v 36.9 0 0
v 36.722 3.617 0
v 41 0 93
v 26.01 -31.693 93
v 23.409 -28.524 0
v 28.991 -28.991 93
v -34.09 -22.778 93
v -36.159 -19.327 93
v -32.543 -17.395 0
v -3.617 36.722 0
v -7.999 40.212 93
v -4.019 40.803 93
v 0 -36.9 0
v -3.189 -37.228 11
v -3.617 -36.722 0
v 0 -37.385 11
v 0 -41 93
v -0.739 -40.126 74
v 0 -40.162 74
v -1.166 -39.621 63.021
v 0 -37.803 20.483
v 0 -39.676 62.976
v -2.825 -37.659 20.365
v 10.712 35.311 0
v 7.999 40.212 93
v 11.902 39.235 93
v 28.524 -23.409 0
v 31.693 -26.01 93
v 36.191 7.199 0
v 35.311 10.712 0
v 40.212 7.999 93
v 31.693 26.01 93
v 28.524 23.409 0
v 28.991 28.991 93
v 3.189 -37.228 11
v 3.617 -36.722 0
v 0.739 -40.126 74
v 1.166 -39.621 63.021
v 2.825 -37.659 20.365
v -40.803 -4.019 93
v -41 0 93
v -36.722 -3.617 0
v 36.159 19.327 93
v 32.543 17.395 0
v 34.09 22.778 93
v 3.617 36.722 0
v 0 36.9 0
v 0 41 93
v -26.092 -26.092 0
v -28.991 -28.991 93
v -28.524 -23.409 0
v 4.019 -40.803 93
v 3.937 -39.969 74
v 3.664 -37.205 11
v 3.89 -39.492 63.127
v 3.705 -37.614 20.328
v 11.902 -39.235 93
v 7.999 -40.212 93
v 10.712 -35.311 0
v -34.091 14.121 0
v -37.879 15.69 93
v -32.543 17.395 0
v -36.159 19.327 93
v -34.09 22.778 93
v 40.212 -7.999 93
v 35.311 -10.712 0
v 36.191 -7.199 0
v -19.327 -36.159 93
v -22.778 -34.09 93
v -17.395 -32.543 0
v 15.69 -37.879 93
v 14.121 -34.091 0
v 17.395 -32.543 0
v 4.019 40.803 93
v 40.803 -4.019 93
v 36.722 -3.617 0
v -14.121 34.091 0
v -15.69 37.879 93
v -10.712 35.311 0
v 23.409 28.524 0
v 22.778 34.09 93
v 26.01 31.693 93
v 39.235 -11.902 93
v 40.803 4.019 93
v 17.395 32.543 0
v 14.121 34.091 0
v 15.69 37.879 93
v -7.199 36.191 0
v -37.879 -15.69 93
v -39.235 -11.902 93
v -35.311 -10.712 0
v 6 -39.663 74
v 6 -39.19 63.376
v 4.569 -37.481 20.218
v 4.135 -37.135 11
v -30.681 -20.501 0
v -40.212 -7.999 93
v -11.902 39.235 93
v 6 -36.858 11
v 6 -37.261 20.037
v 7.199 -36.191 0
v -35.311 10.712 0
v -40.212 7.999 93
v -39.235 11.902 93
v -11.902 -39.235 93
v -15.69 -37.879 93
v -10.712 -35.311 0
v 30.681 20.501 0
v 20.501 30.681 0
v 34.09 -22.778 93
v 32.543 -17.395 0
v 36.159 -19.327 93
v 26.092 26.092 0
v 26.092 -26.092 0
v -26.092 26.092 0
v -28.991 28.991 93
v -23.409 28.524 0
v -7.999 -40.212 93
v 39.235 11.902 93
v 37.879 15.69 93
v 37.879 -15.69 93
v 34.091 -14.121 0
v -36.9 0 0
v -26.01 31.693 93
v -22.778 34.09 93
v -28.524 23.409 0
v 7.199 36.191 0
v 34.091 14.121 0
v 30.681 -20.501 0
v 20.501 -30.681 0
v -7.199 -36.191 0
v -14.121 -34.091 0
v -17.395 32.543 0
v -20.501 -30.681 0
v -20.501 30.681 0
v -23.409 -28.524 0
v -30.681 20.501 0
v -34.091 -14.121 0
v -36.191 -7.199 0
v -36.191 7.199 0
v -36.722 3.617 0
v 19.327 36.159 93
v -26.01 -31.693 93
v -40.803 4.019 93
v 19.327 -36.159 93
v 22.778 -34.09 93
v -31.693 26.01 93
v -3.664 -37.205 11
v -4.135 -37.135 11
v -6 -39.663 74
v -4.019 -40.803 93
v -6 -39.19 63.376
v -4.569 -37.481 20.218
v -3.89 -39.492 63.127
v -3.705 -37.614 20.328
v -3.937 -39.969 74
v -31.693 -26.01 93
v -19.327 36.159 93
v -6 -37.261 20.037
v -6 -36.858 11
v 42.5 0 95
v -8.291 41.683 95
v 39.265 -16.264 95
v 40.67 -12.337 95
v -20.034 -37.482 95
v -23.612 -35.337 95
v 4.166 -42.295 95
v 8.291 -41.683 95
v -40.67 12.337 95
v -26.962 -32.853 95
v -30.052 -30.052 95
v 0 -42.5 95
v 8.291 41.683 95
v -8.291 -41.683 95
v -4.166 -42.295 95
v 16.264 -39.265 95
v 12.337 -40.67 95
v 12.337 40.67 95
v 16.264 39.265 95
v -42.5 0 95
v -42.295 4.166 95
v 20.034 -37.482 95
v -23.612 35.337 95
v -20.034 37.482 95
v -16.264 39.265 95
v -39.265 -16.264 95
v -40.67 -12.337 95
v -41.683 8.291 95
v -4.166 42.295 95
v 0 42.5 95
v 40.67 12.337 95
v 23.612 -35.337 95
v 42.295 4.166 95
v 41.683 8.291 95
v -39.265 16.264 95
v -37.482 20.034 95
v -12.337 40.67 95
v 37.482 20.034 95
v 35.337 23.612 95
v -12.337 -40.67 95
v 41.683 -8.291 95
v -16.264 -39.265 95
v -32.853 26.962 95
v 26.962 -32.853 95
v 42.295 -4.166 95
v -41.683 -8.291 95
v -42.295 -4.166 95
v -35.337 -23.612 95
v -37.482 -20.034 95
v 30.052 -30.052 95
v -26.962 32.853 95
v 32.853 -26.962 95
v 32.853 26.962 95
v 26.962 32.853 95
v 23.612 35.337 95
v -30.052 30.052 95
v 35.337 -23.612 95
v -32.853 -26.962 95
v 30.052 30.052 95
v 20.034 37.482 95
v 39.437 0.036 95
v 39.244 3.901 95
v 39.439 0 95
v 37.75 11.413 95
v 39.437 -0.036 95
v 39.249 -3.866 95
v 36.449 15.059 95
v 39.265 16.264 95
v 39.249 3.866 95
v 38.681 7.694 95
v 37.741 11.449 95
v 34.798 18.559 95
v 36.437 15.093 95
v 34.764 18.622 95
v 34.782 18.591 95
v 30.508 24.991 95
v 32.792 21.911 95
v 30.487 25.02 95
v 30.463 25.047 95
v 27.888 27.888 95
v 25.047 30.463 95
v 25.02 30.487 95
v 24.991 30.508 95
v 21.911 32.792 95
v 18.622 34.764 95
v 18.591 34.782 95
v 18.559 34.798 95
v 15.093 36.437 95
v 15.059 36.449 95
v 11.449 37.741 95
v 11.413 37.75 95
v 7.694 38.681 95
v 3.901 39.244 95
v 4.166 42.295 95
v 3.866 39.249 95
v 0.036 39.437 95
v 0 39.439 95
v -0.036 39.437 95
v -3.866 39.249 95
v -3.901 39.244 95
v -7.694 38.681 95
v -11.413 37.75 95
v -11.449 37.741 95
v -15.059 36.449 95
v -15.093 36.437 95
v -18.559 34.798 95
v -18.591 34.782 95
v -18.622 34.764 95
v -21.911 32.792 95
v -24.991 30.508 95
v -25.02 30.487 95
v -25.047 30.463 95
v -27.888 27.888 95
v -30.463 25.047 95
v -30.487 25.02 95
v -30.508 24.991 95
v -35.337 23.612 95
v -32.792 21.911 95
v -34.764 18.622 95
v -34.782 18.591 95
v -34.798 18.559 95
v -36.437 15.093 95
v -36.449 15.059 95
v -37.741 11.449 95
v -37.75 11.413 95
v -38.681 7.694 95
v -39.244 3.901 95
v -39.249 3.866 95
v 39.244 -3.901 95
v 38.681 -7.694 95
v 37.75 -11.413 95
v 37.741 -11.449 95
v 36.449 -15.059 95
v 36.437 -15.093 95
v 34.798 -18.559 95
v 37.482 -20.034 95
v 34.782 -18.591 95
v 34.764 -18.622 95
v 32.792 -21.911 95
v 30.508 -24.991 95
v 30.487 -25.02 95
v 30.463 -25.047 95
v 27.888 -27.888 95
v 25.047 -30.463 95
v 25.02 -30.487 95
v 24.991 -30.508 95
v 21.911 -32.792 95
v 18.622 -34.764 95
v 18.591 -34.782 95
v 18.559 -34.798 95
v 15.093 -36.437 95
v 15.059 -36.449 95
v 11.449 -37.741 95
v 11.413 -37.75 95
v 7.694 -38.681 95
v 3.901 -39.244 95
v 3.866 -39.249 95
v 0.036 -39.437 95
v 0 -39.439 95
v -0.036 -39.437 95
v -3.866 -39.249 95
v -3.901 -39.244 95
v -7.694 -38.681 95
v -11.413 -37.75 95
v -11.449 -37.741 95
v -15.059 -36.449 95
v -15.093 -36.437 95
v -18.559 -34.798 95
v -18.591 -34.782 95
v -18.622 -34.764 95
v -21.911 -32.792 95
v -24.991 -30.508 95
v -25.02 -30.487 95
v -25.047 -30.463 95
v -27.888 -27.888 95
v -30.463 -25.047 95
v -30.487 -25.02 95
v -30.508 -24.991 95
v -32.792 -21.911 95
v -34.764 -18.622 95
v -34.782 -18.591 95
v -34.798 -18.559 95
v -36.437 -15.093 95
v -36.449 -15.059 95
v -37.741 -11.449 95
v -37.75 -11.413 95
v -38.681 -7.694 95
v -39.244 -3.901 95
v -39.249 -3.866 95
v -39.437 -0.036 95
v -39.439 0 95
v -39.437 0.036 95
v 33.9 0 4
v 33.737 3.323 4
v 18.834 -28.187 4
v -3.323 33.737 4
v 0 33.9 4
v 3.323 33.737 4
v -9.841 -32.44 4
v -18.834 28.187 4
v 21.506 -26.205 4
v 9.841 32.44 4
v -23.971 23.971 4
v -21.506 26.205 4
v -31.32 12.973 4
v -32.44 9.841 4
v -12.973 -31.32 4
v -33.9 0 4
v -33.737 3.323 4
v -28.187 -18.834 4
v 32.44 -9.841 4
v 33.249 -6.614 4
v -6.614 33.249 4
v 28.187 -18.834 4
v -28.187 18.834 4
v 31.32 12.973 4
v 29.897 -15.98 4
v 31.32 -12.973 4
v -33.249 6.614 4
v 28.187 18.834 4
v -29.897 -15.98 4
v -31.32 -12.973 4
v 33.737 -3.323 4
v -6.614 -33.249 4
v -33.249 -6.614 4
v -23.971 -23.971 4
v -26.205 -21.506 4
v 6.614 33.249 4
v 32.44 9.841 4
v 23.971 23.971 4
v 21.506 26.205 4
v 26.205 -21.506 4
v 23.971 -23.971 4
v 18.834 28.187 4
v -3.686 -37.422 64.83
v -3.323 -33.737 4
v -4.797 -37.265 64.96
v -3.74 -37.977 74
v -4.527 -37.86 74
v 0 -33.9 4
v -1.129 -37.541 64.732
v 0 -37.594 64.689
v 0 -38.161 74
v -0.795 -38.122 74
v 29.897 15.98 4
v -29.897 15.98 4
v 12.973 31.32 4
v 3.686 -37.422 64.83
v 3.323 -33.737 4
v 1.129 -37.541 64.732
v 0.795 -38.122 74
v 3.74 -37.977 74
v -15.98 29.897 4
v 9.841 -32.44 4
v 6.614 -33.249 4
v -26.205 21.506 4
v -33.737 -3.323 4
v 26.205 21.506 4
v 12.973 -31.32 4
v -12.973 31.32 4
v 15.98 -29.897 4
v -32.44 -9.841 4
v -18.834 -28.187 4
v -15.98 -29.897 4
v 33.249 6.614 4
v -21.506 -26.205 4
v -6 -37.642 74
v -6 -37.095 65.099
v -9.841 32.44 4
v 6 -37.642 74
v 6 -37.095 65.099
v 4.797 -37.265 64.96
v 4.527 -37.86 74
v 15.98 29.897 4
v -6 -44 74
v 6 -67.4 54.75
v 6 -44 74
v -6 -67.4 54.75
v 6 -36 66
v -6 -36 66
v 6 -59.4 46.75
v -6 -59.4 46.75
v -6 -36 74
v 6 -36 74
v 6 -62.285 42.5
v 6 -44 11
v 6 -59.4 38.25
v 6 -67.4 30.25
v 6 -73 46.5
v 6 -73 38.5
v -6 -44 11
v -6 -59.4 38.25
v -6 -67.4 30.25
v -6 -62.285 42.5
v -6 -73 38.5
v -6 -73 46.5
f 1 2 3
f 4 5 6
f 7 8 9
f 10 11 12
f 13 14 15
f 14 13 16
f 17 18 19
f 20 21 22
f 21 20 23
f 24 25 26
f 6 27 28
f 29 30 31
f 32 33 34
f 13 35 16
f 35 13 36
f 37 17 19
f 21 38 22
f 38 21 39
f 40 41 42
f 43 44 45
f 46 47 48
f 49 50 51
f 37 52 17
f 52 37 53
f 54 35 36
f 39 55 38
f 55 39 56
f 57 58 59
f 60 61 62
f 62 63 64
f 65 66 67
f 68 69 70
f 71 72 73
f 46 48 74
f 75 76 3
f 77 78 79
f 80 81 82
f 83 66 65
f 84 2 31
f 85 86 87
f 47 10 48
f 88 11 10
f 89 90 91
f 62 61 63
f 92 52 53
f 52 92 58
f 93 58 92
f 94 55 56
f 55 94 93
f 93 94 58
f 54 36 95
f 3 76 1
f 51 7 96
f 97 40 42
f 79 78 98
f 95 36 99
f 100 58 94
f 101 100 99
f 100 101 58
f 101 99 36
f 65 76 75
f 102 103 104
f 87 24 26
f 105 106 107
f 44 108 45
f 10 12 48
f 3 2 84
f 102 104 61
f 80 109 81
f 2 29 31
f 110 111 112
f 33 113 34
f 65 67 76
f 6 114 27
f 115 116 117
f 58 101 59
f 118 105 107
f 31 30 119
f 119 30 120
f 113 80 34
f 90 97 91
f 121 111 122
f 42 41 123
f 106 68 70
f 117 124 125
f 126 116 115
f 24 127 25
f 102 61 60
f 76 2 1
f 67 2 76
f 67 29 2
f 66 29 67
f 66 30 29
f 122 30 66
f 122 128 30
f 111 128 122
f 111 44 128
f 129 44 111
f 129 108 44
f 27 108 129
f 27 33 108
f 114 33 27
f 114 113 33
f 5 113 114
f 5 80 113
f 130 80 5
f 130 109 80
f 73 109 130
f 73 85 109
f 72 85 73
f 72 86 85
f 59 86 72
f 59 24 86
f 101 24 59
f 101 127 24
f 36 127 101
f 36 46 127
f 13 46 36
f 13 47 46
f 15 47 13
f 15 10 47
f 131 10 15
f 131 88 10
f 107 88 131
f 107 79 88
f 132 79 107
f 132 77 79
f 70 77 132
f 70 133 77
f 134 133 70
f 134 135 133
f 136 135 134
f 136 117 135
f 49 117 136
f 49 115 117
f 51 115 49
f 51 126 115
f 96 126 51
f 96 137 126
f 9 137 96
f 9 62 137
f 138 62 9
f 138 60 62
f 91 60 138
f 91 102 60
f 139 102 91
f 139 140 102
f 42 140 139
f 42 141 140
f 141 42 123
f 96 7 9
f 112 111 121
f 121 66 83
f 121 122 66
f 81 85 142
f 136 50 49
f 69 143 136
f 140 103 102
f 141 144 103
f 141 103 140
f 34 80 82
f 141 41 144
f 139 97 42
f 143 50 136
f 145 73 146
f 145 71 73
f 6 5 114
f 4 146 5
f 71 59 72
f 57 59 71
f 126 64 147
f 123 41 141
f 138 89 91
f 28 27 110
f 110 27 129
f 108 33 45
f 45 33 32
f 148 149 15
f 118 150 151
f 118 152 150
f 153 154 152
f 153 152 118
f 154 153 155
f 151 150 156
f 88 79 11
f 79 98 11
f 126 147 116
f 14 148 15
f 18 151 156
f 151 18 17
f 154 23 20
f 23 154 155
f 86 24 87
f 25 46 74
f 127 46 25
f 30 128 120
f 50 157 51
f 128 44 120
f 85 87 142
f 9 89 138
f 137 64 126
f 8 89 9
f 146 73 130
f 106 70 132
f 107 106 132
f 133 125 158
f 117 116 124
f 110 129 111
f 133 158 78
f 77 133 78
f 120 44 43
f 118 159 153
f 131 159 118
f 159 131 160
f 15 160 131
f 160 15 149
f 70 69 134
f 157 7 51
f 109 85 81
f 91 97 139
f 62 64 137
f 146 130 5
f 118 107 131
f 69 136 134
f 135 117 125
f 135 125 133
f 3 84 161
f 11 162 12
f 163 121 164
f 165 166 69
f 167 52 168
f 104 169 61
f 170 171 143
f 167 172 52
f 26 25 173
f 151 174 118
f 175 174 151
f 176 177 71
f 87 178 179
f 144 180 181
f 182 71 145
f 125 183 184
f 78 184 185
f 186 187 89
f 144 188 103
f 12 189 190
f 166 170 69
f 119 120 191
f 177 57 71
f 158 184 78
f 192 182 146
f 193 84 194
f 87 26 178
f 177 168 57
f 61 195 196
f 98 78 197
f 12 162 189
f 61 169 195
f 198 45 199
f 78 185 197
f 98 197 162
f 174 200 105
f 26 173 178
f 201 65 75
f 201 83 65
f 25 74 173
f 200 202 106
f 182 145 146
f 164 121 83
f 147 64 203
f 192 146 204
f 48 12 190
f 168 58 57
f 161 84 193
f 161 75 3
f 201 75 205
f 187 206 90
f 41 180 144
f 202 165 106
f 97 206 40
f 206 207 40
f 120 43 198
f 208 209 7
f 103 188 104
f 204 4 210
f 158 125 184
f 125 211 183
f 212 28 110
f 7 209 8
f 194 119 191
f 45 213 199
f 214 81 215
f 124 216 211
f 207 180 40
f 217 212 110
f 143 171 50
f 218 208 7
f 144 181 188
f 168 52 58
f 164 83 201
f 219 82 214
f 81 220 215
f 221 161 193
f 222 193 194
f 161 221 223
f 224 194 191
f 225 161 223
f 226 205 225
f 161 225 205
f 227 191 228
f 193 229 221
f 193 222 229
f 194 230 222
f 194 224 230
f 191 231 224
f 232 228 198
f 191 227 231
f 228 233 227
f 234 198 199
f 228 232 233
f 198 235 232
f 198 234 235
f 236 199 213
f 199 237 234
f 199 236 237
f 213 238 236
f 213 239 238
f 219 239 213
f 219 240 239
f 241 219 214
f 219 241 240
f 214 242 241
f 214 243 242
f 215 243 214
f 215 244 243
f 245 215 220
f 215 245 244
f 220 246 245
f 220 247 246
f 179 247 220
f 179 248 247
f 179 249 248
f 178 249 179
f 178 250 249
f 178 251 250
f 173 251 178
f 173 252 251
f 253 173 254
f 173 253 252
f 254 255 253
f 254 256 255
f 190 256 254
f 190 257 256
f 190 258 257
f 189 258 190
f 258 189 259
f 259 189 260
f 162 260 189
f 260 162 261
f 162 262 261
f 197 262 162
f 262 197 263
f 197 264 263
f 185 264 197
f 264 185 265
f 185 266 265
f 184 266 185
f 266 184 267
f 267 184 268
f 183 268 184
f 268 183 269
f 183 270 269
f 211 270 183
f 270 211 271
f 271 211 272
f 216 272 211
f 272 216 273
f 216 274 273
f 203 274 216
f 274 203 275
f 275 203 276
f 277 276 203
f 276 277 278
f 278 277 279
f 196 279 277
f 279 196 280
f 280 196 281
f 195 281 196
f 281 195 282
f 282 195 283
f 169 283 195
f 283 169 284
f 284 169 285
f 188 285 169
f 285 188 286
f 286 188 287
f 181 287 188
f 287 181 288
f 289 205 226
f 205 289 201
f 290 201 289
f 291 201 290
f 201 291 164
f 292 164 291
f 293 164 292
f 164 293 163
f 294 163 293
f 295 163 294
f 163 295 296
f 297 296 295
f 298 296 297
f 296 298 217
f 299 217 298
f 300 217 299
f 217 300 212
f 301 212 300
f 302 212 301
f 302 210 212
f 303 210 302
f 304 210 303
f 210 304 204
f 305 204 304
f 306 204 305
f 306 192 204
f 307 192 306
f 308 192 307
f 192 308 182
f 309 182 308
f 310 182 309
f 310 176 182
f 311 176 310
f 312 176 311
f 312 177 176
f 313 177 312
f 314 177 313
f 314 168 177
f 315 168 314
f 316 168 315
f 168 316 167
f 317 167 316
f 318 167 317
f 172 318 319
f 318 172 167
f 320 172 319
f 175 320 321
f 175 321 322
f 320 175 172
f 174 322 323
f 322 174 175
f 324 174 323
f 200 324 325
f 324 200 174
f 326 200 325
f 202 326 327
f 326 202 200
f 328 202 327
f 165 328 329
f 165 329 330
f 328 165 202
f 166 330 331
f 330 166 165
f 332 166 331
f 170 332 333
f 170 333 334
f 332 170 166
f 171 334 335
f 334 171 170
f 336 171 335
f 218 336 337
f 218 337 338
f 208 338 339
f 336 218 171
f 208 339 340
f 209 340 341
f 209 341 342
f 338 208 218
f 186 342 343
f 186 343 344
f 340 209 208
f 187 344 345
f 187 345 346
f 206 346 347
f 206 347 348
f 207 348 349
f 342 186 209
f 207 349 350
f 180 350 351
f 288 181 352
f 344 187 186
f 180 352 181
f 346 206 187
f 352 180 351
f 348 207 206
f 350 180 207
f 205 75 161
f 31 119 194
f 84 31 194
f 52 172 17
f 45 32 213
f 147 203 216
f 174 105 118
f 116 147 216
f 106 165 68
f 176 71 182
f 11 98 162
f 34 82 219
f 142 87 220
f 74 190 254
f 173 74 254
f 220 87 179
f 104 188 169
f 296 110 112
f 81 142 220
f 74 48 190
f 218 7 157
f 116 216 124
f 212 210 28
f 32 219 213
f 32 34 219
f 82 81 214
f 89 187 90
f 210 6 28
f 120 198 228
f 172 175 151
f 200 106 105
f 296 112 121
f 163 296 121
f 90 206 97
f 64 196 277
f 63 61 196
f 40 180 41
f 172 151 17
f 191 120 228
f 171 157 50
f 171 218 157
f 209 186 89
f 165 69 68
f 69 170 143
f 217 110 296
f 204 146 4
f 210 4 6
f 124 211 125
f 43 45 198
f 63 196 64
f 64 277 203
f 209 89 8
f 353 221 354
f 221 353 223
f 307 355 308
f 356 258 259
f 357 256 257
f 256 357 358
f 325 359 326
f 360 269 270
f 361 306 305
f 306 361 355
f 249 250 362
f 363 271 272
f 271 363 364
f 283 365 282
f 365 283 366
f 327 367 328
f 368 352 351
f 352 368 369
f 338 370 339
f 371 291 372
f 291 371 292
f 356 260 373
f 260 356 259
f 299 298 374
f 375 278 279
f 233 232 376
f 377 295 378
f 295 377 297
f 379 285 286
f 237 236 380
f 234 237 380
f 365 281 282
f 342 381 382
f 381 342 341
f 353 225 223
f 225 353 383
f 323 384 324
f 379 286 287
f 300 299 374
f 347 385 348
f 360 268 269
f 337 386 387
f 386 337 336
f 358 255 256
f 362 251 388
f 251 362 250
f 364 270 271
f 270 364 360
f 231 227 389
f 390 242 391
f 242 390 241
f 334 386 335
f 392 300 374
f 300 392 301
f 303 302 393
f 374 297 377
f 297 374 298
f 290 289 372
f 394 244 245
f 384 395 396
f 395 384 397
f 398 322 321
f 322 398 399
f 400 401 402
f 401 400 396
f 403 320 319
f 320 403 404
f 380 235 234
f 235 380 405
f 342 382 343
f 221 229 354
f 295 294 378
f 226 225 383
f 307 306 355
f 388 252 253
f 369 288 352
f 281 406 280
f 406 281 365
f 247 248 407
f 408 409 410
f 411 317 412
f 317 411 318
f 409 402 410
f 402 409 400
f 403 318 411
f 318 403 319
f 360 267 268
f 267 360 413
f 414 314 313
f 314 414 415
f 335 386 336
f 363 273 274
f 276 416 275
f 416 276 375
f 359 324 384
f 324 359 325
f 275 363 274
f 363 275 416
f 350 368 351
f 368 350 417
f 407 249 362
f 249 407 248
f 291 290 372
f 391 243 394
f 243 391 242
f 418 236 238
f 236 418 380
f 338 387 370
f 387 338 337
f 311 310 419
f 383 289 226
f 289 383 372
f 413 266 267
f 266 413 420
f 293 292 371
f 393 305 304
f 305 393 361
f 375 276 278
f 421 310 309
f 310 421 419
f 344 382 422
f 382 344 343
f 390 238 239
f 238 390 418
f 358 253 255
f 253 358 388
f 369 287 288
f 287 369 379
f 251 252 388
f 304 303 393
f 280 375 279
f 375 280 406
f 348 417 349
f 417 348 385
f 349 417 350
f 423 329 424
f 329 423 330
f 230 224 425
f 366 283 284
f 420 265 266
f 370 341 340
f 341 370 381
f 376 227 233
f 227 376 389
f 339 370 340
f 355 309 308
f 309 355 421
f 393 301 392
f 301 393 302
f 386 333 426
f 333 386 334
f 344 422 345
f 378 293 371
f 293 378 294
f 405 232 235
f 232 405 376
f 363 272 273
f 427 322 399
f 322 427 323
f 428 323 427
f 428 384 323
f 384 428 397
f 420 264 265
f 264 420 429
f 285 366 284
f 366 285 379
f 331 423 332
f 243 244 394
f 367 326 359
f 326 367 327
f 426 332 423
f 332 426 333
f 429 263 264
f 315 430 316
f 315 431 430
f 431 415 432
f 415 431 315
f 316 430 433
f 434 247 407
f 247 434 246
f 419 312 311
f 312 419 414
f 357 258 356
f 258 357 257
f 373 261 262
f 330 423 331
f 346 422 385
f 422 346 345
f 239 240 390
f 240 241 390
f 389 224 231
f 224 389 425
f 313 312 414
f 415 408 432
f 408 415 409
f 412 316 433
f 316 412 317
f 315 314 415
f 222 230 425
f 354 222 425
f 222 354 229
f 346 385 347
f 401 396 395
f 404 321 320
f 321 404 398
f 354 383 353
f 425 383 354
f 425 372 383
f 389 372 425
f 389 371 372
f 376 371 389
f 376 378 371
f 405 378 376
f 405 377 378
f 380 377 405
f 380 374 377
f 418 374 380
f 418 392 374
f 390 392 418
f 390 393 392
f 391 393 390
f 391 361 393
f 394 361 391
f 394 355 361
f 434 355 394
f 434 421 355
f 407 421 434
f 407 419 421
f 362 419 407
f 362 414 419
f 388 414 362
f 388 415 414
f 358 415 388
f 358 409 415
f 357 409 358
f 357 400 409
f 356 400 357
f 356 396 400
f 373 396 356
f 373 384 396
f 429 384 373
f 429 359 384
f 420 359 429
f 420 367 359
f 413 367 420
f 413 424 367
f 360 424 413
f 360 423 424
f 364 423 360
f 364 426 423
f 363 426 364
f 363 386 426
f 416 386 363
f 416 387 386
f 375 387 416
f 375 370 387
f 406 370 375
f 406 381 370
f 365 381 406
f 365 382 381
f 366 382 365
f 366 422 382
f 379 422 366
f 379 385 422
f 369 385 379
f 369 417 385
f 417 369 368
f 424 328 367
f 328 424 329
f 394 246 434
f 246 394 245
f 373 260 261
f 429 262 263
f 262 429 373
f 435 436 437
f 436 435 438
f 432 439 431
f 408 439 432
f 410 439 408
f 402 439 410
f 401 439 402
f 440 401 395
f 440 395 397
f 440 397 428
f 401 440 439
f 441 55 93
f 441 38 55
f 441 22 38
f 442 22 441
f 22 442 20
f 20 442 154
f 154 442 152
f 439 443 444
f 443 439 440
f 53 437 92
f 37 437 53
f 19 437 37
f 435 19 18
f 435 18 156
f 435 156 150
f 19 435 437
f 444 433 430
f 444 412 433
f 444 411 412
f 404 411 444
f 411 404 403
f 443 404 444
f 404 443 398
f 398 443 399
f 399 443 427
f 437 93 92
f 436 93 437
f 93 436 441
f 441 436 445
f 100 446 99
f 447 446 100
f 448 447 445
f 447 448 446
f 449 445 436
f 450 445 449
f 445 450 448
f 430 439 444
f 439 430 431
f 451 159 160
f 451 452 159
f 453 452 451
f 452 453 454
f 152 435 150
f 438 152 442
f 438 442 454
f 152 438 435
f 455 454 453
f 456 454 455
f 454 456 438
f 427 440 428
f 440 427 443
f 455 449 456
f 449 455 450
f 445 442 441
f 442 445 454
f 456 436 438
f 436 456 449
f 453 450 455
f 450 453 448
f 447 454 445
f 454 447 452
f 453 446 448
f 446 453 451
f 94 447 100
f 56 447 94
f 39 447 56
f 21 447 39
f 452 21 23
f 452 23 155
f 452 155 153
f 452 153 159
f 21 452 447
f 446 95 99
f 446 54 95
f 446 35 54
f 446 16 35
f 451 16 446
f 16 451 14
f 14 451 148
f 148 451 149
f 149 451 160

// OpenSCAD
// ============================================================
// 咖啡杯 Coffee Mug — 参数化3D模型
// Generated by ModelForge (Cascade Agent)
// ============================================================

/* [杯身 / Body] */
body_height = 95;        // [60:1:150] 杯身高度 Body height (mm)
body_diameter = 82;      // [50:1:120] 杯身外径 Body outer diameter (mm)
wall_thickness = 3;      // [1.5:0.5:8] 壁厚 Wall thickness (mm)
bottom_thickness = 4;    // [2:0.5:10] 底部厚度 Bottom thickness (mm)
body_taper = 0.9;        // [0.75:0.01:1.0] 底部收缩比 Bottom taper ratio
lip_height = 2;          // [0:0.5:5] 杯口外翻高度 Lip height (mm)
lip_extra = 1.5;         // [0:0.5:4] 杯口外翻宽度 Lip extra width (mm)

/* [把手 / Handle] */
handle_width = 12;       // [8:1:20] 把手截面宽度 Handle cross-section width (mm)
handle_thickness = 8;    // [5:1:15] 把手截面厚度 Handle cross-section thickness (mm)
handle_span = 55;        // [30:1:80] 把手跨度(高度) Handle vertical span (mm)
handle_depth = 28;       // [15:1:45] 把手深度(伸出距离) Handle protrusion depth (mm)
handle_z_offset = 15;    // [5:1:40] 把手底部离杯底距离 Handle Z offset from bottom (mm)

/* [渲染 / Render] */
quality = 64;            // [16:8:128] 渲染精度 Render quality ($fn)

// ============================================================
// 杯身模块 Body Module
// ============================================================
module body() {
    outer_r_top = body_diameter / 2;
    outer_r_bot = outer_r_top * body_taper;
    inner_r_top = outer_r_top - wall_thickness;
    inner_r_bot = outer_r_bot - wall_thickness;

    difference() {
        union() {
            // 主杯身 - 锥形圆柱
            cylinder(
                h = body_height - lip_height,
                r1 = outer_r_bot,
                r2 = outer_r_top,
                $fn = quality
            );

            // 杯口外翻唇 Lip
            if (lip_height > 0) {
                translate([0, 0, body_height - lip_height])
                    cylinder(
                        h = lip_height,
                        r1 = outer_r_top,
                        r2 = outer_r_top + lip_extra,
                        $fn = quality
                    );
            }
        }

        // 内腔挖空
        translate([0, 0, bottom_thickness])
            cylinder(
                h = body_height - bottom_thickness + 1,
                r1 = inner_r_bot,
                r2 = inner_r_top + lip_extra,
                $fn = quality
            );
    }
}

// ============================================================
// 把手模块 Handle Module
// 4关键点hull连接，D形把手，计算快速
// ============================================================
module handle() {
    body_r = body_diameter / 2;
    bot_z = handle_z_offset;
    top_z = handle_z_offset + handle_span;
    mid_z = (bot_z + top_z) / 2;
    hw = handle_width;
    ht = handle_thickness;

    // 4个关键点: 顶部接杯身、中部外凸、底部接杯身
    // 上段
    hull() {
        // 顶部连接点（贴杯身）
        translate([0, -body_r + 1, top_z])
            cube([hw, ht, ht], center=true);
        // 中上外凸点
        translate([0, -body_r - handle_depth * 0.8, mid_z + handle_span * 0.15])
            cube([hw, ht, ht], center=true);
    }
    // 中段（最外凸）
    hull() {
        translate([0, -body_r - handle_depth * 0.8, mid_z + handle_span * 0.15])
            cube([hw, ht, ht], center=true);
        translate([0, -body_r - handle_depth, mid_z])
            cube([hw, ht, ht], center=true);
    }
    hull() {
        translate([0, -body_r - handle_depth, mid_z])
            cube([hw, ht, ht], center=true);
        translate([0, -body_r - handle_depth * 0.8, mid_z - handle_span * 0.15])
            cube([hw, ht, ht], center=true);
    }
    // 下段
    hull() {
        translate([0, -body_r - handle_depth * 0.8, mid_z - handle_span * 0.15])
            cube([hw, ht, ht], center=true);
        // 底部连接点（贴杯身）
        translate([0, -body_r + 1, bot_z])
            cube([hw, ht, ht], center=true);
    }
}

// ============================================================
// 装配 Assembly
// ============================================================
body();
handle();
